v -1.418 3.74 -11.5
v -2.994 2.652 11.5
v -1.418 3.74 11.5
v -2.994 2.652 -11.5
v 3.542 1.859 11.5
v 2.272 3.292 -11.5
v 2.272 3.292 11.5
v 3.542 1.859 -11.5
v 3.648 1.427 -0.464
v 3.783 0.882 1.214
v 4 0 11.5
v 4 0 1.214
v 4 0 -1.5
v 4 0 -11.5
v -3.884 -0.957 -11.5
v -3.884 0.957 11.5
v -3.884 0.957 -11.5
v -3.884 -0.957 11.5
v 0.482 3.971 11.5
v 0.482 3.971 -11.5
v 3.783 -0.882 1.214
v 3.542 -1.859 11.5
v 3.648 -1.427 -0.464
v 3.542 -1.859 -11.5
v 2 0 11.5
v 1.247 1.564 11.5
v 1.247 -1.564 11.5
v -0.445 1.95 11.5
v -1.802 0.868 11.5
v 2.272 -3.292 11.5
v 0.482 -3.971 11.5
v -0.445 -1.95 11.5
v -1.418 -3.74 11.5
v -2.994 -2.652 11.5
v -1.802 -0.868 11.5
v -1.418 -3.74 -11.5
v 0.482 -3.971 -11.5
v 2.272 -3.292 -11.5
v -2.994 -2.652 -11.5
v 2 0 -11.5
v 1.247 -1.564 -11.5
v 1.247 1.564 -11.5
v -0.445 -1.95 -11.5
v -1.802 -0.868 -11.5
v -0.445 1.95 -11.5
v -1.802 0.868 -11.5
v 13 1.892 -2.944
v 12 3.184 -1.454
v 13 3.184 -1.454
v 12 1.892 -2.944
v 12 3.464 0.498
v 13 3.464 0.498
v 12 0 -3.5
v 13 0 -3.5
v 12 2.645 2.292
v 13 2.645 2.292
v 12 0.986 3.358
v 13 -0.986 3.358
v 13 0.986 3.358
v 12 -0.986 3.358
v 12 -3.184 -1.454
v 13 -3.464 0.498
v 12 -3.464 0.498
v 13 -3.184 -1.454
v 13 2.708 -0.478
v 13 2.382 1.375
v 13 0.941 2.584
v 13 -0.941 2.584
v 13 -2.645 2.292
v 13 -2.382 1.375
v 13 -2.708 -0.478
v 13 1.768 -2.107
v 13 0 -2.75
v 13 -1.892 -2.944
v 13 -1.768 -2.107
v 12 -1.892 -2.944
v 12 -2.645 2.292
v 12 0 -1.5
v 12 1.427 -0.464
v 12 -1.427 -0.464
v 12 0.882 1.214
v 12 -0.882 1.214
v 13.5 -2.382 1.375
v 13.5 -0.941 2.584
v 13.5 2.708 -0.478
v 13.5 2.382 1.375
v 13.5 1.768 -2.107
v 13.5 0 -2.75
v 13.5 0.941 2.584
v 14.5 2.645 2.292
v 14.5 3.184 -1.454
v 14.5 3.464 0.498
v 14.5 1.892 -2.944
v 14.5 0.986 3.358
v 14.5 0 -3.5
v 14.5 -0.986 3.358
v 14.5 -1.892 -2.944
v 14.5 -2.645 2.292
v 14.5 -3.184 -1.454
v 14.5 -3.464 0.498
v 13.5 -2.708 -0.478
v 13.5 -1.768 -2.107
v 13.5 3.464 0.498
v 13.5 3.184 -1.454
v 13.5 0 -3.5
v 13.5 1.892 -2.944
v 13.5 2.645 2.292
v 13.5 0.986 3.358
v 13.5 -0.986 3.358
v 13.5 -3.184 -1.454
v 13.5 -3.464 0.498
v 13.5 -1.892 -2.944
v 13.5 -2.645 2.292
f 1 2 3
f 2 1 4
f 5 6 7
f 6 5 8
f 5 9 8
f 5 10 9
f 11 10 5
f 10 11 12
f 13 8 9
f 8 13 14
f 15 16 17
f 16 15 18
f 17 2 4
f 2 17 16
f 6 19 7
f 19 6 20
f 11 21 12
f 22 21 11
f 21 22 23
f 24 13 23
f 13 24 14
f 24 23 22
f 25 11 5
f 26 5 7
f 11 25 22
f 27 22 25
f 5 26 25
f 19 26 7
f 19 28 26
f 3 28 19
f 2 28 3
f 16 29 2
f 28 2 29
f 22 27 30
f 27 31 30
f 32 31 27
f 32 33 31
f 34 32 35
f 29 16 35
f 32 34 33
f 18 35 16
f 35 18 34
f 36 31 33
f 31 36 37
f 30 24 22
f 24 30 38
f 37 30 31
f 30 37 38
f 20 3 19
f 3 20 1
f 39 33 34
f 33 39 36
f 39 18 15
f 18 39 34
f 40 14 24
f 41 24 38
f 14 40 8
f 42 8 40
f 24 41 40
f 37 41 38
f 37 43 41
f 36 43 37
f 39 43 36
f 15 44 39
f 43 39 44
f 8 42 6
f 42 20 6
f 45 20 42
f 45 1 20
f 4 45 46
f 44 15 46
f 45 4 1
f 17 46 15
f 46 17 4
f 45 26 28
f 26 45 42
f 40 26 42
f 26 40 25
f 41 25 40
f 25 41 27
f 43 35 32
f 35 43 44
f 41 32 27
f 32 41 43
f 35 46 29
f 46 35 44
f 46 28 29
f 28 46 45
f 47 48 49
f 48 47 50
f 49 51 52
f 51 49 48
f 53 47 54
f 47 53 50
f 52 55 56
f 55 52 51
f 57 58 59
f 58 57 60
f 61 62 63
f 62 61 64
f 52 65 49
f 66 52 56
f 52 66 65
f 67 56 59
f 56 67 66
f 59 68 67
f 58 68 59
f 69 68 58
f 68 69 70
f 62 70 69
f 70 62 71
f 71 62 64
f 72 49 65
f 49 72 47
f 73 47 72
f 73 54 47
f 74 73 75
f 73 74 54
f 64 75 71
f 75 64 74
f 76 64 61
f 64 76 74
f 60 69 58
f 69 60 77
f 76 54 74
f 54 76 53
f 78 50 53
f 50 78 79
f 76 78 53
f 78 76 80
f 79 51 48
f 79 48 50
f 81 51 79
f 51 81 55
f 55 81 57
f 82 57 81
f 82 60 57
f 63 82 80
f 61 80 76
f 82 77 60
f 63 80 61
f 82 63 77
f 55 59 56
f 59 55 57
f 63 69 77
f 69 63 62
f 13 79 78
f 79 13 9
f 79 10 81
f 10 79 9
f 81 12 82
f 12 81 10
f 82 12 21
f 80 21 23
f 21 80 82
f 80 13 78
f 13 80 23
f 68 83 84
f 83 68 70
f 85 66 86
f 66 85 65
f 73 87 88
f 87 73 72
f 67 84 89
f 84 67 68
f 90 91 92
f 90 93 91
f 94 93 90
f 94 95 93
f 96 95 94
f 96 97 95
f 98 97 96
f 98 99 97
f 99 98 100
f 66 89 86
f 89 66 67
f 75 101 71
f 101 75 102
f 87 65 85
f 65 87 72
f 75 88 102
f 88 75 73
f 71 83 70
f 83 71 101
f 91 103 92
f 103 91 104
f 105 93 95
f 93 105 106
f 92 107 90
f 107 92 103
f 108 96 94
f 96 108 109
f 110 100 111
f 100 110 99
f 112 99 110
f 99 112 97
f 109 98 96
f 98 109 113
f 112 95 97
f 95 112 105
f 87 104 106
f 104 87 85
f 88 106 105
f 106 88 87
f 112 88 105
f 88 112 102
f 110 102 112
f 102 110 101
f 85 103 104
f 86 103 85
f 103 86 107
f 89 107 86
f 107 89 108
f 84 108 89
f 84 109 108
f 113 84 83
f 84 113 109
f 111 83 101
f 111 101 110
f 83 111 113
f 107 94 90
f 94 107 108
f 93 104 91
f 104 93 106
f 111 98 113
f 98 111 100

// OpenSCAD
// Parameters
bore_diameter_mm = 4.0; //[2.0:8.0:0.1]
outer_diameter_mm = 8.0; //[4.0:16.0:0.1]
length_mm = 23.0; //[12.0:46.0:0.5]
connect_overlap_mm = 1.0; //[0.5:2.0:0.1]

screw_shank_diameter_mm = 3.0; //[2.0:6.0:0.1]
screw_length_mm = 10.0; //[5.0:25.0:0.5]
screw_head_diameter_mm = 5.5; //[3.0:12.0:0.1]
screw_head_height_mm = 2.5; //[1.0:6.0:0.1]

washer_outer_diameter_mm = 7.0; //[4.0:16.0:0.1]
washer_thickness_mm = 1.0; //[0.5:3.0:0.1]
washer_hole_diameter_mm = 3.2; //[2.2:6.5:0.1]

// Linear bearing (MISSING PART FIX: ensure it exists and is included in final union)
module linear_bearing() {
  color("DimGray")
  difference() {
    // Outer casing
    cylinder(r=outer_diameter_mm/2, h=length_mm, center=true);
    // Inner bore (slightly longer to ensure clean through-hole)
    cylinder(r=bore_diameter_mm/2, h=length_mm + 2*connect_overlap_mm, center=true);
  }
}

// Screw + washer + small flanged cylindrical piece (all physically attached)
module screw_and_washer_attached() {
  bearing_r = outer_diameter_mm/2;

  // Place the screw axis along +X, starting slightly inside the bearing OD
  // so the shank intersects the bearing by connect_overlap_mm.
  shank_center_x = bearing_r - connect_overlap_mm + screw_length_mm/2;

  // Washer sits at the far end of the shank, overlapping the shank by connect_overlap_mm
  washer_center_x = (bearing_r - connect_overlap_mm + screw_length_mm) - washer_thickness_mm/2;

  // Flanged cylindrical piece (modeled as a short hub + flange) attached to washer/shank
  flange_thk = washer_thickness_mm;
  hub_len    = screw_head_height_mm;
  hub_d      = screw_head_diameter_mm;
  flange_d   = washer_outer_diameter_mm;

  // Hub starts at the shank end and overlaps into the shank by connect_overlap_mm
  hub_center_x = (bearing_r - connect_overlap_mm + screw_length_mm) + hub_len/2 - connect_overlap_mm;

  // Flange sits at the far end of the hub and overlaps into the hub by connect_overlap_mm
  flange_center_x = (bearing_r - connect_overlap_mm + screw_length_mm + hub_len) - flange_thk/2 - connect_overlap_mm;

  color("Silver")
  union() {
    // Screw shank (connected to bearing by overlap)
    translate([shank_center_x, 0, 0])
      rotate([0, 90, 0])
      cylinder(r=screw_shank_diameter_mm/2, h=screw_length_mm, center=true);

    // Washer (connected to shank by overlap)
    difference() {
      translate([washer_center_x, 0, 0])
        rotate([0, 90, 0])
        cylinder(r=washer_outer_diameter_mm/2, h=washer_thickness_mm, center=true);

      translate([washer_center_x, 0, 0])
        rotate([0, 90, 0])
        cylinder(r=washer_hole_diameter_mm/2, h=washer_thickness_mm + 2*connect_overlap_mm, center=true);
    }

    // Small flanged cylindrical piece (CONNECTED; no floating)
    // Hub
    translate([hub_center_x, 0, 0])
      rotate([0, 90, 0])
      cylinder(r=hub_d/2, h=hub_len, center=true);

    // Flange
    translate([flange_center_x, 0, 0])
      rotate([0, 90, 0])
      cylinder(r=flange_d/2, h=flange_thk, center=true);
  }
}

// Assembly: single connected solid via union()
// Structural fix: ensure the linear bearing is present AND physically connected to the screw.
// The screw already intersects the bearing by connect_overlap_mm, so union() makes one solid.
module assembly() {
  union() {
    linear_bearing();              // REQUIRED missing part added/kept
    screw_and_washer_attached();   // Attached with overlap into bearing OD
  }
}

assembly();
